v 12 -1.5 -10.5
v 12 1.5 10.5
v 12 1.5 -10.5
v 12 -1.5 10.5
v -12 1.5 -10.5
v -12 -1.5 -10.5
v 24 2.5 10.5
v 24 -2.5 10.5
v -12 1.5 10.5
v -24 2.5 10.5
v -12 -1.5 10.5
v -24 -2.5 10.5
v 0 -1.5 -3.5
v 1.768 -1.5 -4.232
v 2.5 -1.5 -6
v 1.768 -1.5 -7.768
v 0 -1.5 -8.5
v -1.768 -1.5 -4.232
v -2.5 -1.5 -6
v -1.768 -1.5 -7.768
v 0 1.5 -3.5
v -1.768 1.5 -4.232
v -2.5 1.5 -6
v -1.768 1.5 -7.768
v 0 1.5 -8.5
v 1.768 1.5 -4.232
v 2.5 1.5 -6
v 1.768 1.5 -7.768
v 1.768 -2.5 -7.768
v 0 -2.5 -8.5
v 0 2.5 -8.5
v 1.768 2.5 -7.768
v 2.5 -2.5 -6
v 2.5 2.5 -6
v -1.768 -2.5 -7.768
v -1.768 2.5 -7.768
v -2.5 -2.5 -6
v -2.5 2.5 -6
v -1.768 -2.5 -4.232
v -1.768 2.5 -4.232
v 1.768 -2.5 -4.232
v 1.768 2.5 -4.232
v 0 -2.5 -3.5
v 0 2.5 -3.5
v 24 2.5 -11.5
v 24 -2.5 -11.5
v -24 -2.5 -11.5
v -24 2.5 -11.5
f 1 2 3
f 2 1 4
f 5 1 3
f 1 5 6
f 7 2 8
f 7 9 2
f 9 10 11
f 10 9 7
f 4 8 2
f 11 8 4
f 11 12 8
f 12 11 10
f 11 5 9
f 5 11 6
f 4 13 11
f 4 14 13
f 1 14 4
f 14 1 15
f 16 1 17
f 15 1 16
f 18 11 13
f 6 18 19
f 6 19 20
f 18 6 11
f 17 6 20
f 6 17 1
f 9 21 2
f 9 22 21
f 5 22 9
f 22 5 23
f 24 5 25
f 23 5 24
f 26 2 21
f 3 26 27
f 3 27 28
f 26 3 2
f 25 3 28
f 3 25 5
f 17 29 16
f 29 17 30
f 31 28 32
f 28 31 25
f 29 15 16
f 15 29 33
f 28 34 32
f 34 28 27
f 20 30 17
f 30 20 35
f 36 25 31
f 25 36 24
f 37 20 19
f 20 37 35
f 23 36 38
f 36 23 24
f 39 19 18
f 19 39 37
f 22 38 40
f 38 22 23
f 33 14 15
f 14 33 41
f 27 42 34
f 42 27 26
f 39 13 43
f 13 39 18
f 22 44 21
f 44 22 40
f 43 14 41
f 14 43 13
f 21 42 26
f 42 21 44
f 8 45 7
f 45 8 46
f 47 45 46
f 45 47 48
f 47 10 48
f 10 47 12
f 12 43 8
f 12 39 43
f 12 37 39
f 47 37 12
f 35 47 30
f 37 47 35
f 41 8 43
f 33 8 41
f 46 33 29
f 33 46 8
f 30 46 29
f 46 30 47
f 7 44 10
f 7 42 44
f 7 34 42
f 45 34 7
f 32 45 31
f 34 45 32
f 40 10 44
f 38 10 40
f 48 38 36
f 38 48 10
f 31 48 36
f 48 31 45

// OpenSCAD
module Cutter() {
    union() {
        cube([24,3,21], center=true);
        rotate([90, 0., 0]) translate([0,6,0]) cylinder(h=20, r=2.5, center=true);
    };
}
// hole - 5mm

module KeyCap() {
    translate([0,0,0.5]) cube([48,5,22], center=true);
}

rotate([180,0,0]) difference() {
    KeyCap();
    Cutter();
}
    
